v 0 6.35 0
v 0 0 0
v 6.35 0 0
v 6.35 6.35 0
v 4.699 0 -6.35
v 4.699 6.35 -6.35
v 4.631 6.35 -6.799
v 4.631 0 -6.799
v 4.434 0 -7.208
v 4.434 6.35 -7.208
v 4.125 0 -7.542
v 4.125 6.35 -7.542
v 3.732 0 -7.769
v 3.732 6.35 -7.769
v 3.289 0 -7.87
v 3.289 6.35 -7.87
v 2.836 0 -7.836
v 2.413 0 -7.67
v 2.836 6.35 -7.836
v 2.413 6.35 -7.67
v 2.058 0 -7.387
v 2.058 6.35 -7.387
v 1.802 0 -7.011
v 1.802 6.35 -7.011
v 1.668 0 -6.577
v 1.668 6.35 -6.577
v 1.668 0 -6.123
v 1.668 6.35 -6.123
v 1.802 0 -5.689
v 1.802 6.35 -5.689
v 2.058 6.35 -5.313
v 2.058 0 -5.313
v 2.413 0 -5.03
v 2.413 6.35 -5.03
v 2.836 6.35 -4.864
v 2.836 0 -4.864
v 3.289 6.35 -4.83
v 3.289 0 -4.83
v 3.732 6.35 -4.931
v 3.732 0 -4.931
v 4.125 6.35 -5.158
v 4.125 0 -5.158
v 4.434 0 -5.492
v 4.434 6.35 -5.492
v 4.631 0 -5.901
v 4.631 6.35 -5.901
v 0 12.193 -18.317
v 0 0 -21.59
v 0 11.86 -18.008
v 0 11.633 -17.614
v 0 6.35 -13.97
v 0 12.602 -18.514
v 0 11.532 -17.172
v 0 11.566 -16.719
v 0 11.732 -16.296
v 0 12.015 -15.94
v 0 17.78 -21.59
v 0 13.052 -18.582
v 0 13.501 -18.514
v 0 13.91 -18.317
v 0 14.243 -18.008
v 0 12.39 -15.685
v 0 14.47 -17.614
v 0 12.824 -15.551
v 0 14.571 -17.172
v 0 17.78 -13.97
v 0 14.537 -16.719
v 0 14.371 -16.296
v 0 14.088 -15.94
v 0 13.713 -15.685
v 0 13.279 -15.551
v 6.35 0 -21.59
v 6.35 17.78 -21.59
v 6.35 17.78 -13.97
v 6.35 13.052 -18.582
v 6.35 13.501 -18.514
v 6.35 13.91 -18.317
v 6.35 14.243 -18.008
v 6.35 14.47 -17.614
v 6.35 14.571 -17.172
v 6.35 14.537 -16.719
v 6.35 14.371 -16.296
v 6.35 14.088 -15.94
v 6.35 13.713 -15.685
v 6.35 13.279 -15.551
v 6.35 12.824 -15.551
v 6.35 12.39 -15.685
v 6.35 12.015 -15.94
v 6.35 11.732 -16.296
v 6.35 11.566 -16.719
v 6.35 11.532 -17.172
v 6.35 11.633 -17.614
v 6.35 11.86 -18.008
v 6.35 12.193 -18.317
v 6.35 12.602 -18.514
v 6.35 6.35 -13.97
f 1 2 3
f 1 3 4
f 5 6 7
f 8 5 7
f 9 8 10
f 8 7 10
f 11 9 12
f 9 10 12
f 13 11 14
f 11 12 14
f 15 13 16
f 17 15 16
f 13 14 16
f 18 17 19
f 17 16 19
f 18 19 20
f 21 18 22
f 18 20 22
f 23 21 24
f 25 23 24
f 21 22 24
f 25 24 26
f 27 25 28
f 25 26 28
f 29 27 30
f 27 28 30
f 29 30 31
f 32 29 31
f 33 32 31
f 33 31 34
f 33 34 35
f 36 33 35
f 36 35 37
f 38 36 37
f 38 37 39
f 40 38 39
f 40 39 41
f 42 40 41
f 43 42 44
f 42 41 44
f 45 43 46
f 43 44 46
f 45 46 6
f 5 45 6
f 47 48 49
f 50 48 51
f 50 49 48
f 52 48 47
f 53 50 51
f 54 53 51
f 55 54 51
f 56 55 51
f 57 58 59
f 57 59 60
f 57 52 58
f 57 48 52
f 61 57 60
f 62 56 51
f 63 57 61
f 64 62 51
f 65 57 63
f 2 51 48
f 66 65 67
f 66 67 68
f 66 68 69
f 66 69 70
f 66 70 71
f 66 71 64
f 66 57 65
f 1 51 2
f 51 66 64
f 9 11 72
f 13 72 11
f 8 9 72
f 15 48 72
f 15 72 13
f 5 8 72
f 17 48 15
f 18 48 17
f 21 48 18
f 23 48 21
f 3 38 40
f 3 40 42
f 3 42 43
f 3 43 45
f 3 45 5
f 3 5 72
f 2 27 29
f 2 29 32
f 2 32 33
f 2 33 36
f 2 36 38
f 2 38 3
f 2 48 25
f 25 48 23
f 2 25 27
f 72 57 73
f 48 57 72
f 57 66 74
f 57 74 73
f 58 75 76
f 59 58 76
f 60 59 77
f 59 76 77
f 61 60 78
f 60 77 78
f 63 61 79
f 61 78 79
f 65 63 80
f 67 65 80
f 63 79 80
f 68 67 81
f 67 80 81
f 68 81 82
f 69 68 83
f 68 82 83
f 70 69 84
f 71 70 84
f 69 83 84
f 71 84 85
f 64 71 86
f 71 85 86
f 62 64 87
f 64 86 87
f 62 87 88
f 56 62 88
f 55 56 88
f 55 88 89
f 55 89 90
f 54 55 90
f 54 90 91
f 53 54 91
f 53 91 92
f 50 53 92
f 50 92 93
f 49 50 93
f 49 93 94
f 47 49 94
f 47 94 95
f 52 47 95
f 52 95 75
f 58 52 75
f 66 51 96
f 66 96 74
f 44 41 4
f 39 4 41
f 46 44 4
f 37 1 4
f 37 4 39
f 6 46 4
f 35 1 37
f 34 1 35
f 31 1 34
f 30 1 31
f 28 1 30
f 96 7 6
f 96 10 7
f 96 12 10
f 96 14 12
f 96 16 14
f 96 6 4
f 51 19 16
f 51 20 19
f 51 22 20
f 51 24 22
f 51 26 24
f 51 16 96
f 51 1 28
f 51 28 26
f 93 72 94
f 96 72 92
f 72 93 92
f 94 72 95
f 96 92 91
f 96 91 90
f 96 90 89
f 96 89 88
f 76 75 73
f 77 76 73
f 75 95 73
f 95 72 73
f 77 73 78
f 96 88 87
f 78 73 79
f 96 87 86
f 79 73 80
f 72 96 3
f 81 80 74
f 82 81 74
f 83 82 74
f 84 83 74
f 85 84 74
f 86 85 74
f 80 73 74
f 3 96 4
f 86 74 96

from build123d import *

# Parameters (mm, degrees)
BOSS_EXTRUDE1_DEPTH = 6.35
SKETCH4_R           = 1.524
CUT_EXTRUDE1_DEPTH  = 6.35
SKETCH5_R           = 1.524
CUT_EXTRUDE3_DEPTH  = 7.35


with BuildPart() as part:
    # Sketch3 → Boss-Extrude1 (new body)
    with BuildSketch(Plane(origin=(0, 0, 0), x_dir=(0, 0, -1), z_dir=(1, 0, 0))):
        Polygon((0, 0), (0, 6.35), (13.97, 6.35), (13.97, 17.78), (21.59, 17.78), (21.59, 0), align=None)
    extrude(amount=BOSS_EXTRUDE1_DEPTH)

    # Sketch4 → Cut-Extrude1 (cut)
    with BuildSketch(Plane(origin=(0, 6.35, 0), x_dir=(1, 0, 0), z_dir=(0, 1, 0))):
        with Locations((3.175, 6.35)):
            Circle(SKETCH4_R)
    extrude(amount=-CUT_EXTRUDE1_DEPTH, mode=Mode.SUBTRACT)

    # Sketch5 → Cut-Extrude3 (cut, through all)
    with BuildSketch(Plane(origin=(6.35, 0, 0), x_dir=(0, 0, -1), z_dir=(1, 0, 0))):
        with Locations((17.057623492, 13.051566734)):
            Circle(SKETCH5_R)
    extrude(amount=-CUT_EXTRUDE3_DEPTH, mode=Mode.SUBTRACT)


solid = part.part
